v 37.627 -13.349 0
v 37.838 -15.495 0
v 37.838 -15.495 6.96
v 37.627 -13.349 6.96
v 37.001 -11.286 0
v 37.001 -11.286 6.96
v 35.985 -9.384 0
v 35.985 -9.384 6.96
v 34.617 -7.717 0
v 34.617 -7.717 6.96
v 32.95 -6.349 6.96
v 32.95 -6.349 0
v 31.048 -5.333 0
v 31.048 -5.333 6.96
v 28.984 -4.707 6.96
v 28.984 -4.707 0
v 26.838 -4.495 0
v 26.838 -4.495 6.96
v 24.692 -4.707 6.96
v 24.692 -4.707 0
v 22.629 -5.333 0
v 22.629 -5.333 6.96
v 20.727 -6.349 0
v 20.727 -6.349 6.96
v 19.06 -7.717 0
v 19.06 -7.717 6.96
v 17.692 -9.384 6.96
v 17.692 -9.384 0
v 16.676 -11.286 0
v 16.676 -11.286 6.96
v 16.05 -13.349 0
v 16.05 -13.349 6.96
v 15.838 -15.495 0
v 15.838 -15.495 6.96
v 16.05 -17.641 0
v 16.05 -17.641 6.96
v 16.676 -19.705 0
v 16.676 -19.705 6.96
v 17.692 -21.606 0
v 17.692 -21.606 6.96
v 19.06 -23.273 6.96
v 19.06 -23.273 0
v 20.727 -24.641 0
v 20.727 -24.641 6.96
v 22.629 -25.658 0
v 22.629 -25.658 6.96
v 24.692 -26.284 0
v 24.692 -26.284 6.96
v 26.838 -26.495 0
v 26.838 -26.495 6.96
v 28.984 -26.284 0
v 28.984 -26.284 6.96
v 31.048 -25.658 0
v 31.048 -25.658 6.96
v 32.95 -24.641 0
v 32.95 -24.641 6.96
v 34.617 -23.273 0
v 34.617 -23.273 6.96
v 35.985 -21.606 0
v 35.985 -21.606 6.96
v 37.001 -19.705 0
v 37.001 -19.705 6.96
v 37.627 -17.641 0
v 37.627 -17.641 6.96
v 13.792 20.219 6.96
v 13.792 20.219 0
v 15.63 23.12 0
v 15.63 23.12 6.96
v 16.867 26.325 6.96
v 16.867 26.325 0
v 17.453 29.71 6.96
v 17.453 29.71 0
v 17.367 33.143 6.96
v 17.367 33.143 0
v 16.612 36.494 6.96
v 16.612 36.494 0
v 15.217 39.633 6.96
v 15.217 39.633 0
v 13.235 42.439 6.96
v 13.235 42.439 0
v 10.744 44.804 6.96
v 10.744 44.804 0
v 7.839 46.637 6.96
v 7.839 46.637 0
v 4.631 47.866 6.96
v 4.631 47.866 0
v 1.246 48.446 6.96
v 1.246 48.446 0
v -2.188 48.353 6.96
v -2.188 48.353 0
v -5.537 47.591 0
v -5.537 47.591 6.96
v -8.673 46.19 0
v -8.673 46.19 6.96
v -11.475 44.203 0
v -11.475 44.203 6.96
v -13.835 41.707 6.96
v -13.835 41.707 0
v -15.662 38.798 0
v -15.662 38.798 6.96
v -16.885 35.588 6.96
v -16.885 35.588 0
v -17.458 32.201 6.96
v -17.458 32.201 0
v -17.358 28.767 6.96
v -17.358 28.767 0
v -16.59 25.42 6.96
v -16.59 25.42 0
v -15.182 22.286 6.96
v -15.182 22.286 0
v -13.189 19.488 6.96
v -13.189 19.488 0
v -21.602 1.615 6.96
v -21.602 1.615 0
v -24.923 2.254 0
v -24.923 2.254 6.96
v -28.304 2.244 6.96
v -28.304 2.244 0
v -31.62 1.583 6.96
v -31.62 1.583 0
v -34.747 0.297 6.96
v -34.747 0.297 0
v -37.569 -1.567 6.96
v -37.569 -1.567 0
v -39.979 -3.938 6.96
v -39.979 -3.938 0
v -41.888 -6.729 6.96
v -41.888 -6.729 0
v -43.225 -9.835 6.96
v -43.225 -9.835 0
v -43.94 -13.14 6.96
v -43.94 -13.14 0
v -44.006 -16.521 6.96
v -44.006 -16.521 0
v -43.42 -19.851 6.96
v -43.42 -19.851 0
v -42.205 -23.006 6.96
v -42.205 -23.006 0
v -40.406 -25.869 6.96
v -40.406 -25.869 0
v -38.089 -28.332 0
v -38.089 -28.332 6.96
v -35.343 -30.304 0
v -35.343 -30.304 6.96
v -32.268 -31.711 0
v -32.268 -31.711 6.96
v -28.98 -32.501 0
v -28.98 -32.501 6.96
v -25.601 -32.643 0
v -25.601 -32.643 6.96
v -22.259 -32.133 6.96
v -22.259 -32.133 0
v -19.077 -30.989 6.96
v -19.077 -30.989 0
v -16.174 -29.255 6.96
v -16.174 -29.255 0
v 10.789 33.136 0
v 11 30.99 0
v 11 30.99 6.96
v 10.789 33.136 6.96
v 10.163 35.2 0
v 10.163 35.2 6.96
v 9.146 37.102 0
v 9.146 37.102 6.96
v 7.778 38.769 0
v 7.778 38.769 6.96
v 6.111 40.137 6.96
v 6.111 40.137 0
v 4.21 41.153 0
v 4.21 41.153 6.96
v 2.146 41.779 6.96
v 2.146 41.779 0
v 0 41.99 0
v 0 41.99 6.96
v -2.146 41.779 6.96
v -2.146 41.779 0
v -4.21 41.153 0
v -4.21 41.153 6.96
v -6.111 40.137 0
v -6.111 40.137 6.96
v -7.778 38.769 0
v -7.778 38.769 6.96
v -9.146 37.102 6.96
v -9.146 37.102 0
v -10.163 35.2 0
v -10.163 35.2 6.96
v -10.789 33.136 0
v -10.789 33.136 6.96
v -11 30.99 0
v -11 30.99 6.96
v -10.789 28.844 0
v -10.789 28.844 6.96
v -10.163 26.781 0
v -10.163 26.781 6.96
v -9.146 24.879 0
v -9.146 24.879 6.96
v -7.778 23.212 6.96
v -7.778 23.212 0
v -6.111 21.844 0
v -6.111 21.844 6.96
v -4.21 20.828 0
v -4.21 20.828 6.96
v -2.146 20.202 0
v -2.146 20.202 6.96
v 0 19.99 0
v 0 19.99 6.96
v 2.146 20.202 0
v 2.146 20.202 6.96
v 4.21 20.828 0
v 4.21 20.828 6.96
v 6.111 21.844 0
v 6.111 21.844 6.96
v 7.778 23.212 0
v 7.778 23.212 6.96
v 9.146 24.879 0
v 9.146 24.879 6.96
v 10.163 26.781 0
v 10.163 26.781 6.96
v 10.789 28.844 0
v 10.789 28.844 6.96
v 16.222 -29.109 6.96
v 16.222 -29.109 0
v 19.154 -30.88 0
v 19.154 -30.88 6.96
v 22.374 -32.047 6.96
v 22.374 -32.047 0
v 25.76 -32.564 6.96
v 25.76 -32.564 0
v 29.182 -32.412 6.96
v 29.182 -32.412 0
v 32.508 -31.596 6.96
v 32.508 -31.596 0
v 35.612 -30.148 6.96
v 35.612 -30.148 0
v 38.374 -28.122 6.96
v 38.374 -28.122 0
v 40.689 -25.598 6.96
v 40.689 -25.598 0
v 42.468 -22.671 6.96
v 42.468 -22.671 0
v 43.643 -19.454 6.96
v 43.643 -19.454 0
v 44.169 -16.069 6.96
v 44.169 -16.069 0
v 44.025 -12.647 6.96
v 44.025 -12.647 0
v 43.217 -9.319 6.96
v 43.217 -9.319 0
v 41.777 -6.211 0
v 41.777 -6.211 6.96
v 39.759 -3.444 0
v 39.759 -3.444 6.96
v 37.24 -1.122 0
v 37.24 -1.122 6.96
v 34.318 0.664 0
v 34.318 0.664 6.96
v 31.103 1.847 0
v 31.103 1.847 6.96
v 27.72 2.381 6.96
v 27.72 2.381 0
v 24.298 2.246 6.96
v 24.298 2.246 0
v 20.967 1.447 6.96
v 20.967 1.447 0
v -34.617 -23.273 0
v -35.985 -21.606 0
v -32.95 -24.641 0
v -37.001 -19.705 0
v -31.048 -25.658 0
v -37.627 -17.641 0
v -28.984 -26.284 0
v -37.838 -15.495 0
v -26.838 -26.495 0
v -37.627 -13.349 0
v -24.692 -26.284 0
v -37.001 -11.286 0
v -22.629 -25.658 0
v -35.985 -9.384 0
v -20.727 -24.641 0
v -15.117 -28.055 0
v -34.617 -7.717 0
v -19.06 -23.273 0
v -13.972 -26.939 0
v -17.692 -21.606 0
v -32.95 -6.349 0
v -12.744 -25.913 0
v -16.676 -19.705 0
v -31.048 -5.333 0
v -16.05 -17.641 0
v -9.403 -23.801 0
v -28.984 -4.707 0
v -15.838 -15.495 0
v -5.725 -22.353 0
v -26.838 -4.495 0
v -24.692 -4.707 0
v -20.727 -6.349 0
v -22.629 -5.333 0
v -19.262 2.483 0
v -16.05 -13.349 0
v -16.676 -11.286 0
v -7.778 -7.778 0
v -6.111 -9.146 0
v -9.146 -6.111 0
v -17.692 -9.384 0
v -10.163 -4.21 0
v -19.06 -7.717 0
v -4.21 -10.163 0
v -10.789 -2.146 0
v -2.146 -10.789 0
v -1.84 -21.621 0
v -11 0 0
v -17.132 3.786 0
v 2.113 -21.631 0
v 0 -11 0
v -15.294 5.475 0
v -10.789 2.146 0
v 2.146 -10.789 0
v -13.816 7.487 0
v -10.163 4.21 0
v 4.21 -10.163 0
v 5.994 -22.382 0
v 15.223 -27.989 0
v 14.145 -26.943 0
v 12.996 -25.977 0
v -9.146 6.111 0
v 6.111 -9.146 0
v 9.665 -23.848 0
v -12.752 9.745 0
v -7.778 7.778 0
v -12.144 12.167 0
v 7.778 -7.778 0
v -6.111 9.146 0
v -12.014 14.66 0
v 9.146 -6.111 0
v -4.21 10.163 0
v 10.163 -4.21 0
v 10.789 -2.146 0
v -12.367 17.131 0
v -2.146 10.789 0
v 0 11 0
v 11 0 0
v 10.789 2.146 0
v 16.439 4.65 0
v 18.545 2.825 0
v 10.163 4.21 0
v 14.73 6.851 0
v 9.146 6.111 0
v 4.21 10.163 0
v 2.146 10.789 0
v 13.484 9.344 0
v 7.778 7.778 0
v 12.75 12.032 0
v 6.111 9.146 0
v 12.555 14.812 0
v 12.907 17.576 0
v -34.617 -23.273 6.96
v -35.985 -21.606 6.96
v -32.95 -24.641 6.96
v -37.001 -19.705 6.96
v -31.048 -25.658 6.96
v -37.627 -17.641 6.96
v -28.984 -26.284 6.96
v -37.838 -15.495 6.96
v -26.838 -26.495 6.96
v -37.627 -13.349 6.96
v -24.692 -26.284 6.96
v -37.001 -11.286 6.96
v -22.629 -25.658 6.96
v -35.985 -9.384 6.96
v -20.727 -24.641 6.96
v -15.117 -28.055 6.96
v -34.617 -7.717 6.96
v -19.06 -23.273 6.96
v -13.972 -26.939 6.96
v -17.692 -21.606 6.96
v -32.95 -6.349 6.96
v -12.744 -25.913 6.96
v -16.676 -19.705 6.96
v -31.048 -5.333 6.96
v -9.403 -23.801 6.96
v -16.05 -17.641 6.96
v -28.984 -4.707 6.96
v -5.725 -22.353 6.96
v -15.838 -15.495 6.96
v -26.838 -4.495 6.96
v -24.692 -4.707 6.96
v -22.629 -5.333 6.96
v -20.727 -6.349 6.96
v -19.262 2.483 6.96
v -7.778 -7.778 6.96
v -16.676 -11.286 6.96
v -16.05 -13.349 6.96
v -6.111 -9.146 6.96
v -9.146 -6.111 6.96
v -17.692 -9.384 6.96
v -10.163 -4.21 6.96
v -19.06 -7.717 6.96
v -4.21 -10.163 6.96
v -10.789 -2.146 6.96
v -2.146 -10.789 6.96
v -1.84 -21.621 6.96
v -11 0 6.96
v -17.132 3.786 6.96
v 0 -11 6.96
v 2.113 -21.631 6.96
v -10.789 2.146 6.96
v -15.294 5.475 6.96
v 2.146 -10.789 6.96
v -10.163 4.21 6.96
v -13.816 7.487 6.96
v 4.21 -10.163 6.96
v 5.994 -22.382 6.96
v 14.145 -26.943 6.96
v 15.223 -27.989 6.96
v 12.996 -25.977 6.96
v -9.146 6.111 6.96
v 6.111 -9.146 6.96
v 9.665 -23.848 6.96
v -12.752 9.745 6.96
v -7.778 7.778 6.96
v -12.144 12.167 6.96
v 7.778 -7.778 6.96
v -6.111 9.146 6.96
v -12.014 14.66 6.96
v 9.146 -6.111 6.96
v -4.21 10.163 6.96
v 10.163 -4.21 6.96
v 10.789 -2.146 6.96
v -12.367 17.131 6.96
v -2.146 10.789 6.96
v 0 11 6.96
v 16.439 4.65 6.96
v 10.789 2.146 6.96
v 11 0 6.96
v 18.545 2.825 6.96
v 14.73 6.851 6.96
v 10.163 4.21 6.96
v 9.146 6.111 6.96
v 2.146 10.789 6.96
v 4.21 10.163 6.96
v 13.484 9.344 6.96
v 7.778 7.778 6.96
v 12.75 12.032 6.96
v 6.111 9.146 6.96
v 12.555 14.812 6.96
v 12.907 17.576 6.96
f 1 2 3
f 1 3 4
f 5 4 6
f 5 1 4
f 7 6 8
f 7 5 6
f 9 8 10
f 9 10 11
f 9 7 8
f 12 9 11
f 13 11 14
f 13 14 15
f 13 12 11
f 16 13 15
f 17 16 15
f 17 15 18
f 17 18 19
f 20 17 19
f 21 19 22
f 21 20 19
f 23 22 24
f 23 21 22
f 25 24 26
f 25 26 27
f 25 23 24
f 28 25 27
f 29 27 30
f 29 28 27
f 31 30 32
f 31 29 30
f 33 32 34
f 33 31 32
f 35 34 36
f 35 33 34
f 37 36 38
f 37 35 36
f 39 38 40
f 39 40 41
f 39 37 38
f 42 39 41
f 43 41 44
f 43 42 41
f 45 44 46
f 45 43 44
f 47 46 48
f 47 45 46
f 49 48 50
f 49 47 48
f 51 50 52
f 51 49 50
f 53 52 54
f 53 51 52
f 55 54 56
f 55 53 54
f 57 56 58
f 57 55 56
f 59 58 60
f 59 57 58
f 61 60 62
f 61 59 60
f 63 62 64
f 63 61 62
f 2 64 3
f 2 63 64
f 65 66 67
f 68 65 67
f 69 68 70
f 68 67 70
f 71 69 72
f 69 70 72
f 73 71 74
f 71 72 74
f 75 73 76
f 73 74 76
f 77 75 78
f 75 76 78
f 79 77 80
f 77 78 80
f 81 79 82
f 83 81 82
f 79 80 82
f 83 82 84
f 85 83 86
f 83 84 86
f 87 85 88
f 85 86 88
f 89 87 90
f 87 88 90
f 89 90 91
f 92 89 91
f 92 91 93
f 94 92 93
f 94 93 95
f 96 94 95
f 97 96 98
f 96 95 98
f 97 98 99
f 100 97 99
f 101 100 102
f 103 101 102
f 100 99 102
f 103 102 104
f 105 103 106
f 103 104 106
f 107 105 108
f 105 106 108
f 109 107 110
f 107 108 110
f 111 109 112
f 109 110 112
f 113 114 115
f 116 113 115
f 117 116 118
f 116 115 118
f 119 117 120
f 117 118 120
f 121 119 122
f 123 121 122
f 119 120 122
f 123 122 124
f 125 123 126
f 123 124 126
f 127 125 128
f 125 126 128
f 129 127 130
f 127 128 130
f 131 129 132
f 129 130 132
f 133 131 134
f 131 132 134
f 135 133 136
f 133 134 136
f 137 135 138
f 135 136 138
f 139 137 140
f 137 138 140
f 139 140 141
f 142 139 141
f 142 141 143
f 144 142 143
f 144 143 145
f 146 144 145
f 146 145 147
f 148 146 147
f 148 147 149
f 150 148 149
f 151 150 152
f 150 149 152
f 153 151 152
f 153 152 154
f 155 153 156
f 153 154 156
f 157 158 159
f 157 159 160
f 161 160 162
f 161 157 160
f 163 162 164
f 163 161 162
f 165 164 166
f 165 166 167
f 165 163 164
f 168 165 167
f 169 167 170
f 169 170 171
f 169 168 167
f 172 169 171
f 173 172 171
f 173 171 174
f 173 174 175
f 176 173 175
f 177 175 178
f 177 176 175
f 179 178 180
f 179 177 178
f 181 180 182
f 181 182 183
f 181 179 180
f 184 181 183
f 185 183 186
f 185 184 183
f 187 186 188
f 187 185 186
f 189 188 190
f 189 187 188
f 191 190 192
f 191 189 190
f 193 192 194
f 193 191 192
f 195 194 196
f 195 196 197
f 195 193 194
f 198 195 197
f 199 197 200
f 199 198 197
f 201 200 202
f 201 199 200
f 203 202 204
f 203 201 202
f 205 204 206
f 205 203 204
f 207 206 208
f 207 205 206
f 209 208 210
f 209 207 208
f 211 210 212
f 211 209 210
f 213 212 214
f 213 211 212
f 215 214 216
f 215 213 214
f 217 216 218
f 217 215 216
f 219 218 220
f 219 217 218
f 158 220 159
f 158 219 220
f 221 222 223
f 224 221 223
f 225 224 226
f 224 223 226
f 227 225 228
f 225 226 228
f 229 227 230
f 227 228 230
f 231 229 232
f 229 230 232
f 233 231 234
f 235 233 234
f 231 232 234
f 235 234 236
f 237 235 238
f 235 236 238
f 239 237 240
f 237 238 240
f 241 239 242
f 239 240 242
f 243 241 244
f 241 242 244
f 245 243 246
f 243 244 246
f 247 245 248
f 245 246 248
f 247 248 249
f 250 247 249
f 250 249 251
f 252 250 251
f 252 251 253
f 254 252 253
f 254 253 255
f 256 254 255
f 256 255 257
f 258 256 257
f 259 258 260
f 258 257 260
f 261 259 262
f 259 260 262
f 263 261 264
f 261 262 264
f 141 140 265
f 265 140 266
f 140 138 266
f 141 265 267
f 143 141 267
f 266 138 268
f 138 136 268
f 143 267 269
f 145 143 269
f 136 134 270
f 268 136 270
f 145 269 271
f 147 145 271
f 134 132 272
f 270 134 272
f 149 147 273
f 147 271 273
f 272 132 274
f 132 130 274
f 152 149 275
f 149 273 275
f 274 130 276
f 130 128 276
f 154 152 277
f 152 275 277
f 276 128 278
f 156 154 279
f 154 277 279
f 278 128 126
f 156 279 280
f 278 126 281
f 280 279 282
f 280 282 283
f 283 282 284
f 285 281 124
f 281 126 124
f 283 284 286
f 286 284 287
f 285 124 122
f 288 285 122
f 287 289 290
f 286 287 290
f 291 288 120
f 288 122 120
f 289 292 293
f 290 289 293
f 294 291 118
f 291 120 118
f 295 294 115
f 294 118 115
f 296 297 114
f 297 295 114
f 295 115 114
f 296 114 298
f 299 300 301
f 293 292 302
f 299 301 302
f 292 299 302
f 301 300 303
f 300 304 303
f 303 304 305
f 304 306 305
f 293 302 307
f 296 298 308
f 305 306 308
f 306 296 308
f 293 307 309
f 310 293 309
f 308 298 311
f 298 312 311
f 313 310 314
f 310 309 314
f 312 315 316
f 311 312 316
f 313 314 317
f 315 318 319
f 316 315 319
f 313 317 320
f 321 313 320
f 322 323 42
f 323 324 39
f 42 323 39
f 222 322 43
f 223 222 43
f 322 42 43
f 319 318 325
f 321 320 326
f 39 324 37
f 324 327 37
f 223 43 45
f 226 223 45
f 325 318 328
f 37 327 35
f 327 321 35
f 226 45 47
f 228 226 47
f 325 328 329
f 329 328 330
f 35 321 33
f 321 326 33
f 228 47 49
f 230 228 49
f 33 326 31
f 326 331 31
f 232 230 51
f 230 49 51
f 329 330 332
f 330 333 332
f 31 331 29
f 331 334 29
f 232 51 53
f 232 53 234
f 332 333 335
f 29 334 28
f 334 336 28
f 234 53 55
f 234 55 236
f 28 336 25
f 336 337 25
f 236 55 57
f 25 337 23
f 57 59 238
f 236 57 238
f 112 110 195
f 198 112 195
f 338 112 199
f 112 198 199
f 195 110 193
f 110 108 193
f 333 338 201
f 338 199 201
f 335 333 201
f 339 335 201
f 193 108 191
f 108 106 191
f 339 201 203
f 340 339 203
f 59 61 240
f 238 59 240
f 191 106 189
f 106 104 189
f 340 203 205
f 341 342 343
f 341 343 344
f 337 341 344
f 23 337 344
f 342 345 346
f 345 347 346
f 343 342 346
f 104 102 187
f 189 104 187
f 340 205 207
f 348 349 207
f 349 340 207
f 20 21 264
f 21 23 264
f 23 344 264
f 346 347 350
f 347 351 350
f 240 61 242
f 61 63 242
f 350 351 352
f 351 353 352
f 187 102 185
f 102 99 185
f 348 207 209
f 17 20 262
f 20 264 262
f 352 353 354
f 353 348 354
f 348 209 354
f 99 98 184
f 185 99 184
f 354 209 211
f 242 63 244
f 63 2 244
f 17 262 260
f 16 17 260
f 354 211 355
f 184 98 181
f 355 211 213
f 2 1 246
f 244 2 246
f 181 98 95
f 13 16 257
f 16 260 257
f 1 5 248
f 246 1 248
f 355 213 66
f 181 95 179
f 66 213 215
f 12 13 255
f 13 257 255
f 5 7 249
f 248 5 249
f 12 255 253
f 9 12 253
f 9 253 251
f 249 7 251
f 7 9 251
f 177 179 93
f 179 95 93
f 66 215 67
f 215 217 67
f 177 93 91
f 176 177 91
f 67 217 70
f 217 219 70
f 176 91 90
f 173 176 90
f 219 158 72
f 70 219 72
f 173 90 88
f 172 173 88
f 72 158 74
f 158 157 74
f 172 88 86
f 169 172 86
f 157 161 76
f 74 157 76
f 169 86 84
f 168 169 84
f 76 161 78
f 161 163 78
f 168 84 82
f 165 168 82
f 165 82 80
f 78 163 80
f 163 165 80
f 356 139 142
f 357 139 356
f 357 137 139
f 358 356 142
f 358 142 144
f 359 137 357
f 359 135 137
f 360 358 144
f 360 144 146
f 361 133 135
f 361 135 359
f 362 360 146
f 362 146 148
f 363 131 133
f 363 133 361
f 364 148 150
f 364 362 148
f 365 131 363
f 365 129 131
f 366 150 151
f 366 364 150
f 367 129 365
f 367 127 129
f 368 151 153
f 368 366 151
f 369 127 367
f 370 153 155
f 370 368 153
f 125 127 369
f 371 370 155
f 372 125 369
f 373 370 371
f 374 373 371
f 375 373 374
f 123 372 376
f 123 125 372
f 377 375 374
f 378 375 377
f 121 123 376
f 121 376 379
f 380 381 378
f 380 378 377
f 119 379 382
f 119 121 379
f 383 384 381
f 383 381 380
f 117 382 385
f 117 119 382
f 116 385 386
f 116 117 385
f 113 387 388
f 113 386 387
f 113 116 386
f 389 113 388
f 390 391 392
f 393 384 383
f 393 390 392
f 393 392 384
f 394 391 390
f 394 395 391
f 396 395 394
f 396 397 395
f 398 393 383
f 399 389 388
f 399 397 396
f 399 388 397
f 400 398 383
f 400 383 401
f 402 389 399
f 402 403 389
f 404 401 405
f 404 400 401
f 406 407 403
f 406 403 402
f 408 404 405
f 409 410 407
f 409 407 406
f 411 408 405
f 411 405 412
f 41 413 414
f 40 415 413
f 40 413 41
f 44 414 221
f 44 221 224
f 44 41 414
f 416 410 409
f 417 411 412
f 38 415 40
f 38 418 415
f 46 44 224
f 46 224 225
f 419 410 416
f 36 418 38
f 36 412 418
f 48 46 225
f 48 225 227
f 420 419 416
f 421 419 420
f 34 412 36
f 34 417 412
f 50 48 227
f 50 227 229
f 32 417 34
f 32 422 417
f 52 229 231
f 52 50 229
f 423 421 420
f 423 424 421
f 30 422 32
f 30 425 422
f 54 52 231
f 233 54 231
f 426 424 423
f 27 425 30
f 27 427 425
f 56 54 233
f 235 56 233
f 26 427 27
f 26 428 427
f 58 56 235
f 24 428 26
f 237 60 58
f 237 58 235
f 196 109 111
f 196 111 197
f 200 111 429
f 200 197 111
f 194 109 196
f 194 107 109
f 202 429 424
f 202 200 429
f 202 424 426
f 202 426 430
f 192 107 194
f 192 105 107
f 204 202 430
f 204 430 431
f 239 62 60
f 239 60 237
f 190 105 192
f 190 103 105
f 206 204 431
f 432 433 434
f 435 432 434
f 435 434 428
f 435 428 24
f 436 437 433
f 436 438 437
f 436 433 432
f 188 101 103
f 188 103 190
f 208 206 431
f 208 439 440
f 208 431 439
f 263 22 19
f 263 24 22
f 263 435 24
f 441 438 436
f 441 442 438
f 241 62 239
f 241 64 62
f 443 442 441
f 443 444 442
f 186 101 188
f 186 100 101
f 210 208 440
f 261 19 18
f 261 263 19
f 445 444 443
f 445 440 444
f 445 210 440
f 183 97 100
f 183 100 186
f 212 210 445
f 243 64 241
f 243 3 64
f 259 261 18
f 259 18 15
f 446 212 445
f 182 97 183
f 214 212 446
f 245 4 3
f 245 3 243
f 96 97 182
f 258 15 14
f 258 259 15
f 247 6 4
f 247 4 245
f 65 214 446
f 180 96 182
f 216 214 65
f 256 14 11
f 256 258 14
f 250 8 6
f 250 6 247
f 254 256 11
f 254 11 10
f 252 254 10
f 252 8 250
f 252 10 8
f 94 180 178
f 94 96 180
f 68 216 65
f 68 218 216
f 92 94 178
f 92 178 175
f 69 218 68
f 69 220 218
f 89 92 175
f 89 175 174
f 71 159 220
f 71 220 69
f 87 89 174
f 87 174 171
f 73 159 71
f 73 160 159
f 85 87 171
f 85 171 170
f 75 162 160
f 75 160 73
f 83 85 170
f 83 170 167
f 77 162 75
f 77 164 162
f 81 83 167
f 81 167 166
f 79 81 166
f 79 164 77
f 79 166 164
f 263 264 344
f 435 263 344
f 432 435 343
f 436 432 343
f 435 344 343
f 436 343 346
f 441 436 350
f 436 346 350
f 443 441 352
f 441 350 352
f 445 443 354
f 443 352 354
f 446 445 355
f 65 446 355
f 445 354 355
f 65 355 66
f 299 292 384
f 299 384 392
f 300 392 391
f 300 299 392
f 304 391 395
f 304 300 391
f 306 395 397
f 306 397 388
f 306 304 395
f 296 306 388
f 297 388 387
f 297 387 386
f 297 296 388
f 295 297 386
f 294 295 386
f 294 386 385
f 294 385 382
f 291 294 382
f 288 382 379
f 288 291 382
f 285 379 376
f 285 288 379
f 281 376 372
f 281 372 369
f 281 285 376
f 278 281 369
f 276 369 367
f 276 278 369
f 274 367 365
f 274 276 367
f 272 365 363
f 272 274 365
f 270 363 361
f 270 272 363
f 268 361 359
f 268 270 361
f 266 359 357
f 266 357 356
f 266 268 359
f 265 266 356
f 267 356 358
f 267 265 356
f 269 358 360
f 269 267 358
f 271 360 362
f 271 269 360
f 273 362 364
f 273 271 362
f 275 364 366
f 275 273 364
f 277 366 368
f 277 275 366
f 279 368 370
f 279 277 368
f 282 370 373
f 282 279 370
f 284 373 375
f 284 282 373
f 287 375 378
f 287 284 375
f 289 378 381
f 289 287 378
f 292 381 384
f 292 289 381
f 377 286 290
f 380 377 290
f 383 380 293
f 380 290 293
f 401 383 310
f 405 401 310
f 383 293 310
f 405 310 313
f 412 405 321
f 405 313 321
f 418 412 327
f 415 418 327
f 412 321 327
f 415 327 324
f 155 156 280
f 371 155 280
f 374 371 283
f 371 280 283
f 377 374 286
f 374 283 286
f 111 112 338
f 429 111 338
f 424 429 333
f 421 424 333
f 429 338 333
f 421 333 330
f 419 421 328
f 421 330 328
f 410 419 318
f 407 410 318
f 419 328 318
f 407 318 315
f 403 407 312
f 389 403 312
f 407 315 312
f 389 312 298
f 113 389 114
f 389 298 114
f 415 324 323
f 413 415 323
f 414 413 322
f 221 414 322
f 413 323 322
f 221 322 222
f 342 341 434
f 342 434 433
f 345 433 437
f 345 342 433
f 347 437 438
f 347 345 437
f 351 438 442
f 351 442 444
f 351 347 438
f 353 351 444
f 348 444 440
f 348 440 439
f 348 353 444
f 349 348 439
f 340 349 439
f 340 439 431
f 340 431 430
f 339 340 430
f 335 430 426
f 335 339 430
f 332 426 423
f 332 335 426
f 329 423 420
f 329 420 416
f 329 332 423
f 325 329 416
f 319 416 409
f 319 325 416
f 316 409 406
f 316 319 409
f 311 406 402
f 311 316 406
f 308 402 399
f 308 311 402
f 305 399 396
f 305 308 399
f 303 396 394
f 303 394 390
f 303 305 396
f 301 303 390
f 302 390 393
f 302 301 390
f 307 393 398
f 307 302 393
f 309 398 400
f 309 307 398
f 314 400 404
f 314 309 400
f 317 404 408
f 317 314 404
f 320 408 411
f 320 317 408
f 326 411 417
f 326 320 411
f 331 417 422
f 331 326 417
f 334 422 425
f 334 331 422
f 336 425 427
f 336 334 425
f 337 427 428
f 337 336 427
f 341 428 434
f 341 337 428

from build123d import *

# Parameters (mm, degrees)
F0_R     = 11
F1_DEPTH = 6.96


with BuildPart() as f1:
    # F0 (on Top) → F1 (new body)
    with BuildSketch(Plane.XY):
        with BuildLine():
            ThreePointArc((20.967224, 1.44653), (13.484367, 9.343679), (13.791942, 20.218582))
            ThreePointArc((13.791942, 20.218582), (-0.473405, 48.484008), (-13.189176, 19.488428))
            ThreePointArc((-13.189176, 19.488428), (-13.229135, 8.590307), (-21.602449, 1.614759))
            ThreePointArc((-21.602449, 1.614759), (-43.793526, -18.199862), (-16.173887, -29.255114))
            ThreePointArc((-16.173887, -29.255114), (-14.55487, -27.485928), (-12.744492, -25.913108))
            ThreePointArc((-12.744492, -25.913108), (0.13651, -21.532556), (12.995613, -25.976982))
            ThreePointArc((12.995613, -25.976982), (14.693213, -27.456193), (16.222473, -29.108848))
            ThreePointArc((16.222473, -29.108848), (43.988926, -17.774444), (20.967224, 1.44653))
        make_face()
        with Locations((-26.838484, -15.495206)):
            Circle(F0_R, mode=Mode.SUBTRACT)
        Circle(F0_R, mode=Mode.SUBTRACT)
        with Locations((26.838484, -15.495206)):
            Circle(F0_R, mode=Mode.SUBTRACT)
        with Locations((0, 30.990412)):
            Circle(F0_R, mode=Mode.SUBTRACT)
    extrude(amount=F1_DEPTH)


solid = f1.part
